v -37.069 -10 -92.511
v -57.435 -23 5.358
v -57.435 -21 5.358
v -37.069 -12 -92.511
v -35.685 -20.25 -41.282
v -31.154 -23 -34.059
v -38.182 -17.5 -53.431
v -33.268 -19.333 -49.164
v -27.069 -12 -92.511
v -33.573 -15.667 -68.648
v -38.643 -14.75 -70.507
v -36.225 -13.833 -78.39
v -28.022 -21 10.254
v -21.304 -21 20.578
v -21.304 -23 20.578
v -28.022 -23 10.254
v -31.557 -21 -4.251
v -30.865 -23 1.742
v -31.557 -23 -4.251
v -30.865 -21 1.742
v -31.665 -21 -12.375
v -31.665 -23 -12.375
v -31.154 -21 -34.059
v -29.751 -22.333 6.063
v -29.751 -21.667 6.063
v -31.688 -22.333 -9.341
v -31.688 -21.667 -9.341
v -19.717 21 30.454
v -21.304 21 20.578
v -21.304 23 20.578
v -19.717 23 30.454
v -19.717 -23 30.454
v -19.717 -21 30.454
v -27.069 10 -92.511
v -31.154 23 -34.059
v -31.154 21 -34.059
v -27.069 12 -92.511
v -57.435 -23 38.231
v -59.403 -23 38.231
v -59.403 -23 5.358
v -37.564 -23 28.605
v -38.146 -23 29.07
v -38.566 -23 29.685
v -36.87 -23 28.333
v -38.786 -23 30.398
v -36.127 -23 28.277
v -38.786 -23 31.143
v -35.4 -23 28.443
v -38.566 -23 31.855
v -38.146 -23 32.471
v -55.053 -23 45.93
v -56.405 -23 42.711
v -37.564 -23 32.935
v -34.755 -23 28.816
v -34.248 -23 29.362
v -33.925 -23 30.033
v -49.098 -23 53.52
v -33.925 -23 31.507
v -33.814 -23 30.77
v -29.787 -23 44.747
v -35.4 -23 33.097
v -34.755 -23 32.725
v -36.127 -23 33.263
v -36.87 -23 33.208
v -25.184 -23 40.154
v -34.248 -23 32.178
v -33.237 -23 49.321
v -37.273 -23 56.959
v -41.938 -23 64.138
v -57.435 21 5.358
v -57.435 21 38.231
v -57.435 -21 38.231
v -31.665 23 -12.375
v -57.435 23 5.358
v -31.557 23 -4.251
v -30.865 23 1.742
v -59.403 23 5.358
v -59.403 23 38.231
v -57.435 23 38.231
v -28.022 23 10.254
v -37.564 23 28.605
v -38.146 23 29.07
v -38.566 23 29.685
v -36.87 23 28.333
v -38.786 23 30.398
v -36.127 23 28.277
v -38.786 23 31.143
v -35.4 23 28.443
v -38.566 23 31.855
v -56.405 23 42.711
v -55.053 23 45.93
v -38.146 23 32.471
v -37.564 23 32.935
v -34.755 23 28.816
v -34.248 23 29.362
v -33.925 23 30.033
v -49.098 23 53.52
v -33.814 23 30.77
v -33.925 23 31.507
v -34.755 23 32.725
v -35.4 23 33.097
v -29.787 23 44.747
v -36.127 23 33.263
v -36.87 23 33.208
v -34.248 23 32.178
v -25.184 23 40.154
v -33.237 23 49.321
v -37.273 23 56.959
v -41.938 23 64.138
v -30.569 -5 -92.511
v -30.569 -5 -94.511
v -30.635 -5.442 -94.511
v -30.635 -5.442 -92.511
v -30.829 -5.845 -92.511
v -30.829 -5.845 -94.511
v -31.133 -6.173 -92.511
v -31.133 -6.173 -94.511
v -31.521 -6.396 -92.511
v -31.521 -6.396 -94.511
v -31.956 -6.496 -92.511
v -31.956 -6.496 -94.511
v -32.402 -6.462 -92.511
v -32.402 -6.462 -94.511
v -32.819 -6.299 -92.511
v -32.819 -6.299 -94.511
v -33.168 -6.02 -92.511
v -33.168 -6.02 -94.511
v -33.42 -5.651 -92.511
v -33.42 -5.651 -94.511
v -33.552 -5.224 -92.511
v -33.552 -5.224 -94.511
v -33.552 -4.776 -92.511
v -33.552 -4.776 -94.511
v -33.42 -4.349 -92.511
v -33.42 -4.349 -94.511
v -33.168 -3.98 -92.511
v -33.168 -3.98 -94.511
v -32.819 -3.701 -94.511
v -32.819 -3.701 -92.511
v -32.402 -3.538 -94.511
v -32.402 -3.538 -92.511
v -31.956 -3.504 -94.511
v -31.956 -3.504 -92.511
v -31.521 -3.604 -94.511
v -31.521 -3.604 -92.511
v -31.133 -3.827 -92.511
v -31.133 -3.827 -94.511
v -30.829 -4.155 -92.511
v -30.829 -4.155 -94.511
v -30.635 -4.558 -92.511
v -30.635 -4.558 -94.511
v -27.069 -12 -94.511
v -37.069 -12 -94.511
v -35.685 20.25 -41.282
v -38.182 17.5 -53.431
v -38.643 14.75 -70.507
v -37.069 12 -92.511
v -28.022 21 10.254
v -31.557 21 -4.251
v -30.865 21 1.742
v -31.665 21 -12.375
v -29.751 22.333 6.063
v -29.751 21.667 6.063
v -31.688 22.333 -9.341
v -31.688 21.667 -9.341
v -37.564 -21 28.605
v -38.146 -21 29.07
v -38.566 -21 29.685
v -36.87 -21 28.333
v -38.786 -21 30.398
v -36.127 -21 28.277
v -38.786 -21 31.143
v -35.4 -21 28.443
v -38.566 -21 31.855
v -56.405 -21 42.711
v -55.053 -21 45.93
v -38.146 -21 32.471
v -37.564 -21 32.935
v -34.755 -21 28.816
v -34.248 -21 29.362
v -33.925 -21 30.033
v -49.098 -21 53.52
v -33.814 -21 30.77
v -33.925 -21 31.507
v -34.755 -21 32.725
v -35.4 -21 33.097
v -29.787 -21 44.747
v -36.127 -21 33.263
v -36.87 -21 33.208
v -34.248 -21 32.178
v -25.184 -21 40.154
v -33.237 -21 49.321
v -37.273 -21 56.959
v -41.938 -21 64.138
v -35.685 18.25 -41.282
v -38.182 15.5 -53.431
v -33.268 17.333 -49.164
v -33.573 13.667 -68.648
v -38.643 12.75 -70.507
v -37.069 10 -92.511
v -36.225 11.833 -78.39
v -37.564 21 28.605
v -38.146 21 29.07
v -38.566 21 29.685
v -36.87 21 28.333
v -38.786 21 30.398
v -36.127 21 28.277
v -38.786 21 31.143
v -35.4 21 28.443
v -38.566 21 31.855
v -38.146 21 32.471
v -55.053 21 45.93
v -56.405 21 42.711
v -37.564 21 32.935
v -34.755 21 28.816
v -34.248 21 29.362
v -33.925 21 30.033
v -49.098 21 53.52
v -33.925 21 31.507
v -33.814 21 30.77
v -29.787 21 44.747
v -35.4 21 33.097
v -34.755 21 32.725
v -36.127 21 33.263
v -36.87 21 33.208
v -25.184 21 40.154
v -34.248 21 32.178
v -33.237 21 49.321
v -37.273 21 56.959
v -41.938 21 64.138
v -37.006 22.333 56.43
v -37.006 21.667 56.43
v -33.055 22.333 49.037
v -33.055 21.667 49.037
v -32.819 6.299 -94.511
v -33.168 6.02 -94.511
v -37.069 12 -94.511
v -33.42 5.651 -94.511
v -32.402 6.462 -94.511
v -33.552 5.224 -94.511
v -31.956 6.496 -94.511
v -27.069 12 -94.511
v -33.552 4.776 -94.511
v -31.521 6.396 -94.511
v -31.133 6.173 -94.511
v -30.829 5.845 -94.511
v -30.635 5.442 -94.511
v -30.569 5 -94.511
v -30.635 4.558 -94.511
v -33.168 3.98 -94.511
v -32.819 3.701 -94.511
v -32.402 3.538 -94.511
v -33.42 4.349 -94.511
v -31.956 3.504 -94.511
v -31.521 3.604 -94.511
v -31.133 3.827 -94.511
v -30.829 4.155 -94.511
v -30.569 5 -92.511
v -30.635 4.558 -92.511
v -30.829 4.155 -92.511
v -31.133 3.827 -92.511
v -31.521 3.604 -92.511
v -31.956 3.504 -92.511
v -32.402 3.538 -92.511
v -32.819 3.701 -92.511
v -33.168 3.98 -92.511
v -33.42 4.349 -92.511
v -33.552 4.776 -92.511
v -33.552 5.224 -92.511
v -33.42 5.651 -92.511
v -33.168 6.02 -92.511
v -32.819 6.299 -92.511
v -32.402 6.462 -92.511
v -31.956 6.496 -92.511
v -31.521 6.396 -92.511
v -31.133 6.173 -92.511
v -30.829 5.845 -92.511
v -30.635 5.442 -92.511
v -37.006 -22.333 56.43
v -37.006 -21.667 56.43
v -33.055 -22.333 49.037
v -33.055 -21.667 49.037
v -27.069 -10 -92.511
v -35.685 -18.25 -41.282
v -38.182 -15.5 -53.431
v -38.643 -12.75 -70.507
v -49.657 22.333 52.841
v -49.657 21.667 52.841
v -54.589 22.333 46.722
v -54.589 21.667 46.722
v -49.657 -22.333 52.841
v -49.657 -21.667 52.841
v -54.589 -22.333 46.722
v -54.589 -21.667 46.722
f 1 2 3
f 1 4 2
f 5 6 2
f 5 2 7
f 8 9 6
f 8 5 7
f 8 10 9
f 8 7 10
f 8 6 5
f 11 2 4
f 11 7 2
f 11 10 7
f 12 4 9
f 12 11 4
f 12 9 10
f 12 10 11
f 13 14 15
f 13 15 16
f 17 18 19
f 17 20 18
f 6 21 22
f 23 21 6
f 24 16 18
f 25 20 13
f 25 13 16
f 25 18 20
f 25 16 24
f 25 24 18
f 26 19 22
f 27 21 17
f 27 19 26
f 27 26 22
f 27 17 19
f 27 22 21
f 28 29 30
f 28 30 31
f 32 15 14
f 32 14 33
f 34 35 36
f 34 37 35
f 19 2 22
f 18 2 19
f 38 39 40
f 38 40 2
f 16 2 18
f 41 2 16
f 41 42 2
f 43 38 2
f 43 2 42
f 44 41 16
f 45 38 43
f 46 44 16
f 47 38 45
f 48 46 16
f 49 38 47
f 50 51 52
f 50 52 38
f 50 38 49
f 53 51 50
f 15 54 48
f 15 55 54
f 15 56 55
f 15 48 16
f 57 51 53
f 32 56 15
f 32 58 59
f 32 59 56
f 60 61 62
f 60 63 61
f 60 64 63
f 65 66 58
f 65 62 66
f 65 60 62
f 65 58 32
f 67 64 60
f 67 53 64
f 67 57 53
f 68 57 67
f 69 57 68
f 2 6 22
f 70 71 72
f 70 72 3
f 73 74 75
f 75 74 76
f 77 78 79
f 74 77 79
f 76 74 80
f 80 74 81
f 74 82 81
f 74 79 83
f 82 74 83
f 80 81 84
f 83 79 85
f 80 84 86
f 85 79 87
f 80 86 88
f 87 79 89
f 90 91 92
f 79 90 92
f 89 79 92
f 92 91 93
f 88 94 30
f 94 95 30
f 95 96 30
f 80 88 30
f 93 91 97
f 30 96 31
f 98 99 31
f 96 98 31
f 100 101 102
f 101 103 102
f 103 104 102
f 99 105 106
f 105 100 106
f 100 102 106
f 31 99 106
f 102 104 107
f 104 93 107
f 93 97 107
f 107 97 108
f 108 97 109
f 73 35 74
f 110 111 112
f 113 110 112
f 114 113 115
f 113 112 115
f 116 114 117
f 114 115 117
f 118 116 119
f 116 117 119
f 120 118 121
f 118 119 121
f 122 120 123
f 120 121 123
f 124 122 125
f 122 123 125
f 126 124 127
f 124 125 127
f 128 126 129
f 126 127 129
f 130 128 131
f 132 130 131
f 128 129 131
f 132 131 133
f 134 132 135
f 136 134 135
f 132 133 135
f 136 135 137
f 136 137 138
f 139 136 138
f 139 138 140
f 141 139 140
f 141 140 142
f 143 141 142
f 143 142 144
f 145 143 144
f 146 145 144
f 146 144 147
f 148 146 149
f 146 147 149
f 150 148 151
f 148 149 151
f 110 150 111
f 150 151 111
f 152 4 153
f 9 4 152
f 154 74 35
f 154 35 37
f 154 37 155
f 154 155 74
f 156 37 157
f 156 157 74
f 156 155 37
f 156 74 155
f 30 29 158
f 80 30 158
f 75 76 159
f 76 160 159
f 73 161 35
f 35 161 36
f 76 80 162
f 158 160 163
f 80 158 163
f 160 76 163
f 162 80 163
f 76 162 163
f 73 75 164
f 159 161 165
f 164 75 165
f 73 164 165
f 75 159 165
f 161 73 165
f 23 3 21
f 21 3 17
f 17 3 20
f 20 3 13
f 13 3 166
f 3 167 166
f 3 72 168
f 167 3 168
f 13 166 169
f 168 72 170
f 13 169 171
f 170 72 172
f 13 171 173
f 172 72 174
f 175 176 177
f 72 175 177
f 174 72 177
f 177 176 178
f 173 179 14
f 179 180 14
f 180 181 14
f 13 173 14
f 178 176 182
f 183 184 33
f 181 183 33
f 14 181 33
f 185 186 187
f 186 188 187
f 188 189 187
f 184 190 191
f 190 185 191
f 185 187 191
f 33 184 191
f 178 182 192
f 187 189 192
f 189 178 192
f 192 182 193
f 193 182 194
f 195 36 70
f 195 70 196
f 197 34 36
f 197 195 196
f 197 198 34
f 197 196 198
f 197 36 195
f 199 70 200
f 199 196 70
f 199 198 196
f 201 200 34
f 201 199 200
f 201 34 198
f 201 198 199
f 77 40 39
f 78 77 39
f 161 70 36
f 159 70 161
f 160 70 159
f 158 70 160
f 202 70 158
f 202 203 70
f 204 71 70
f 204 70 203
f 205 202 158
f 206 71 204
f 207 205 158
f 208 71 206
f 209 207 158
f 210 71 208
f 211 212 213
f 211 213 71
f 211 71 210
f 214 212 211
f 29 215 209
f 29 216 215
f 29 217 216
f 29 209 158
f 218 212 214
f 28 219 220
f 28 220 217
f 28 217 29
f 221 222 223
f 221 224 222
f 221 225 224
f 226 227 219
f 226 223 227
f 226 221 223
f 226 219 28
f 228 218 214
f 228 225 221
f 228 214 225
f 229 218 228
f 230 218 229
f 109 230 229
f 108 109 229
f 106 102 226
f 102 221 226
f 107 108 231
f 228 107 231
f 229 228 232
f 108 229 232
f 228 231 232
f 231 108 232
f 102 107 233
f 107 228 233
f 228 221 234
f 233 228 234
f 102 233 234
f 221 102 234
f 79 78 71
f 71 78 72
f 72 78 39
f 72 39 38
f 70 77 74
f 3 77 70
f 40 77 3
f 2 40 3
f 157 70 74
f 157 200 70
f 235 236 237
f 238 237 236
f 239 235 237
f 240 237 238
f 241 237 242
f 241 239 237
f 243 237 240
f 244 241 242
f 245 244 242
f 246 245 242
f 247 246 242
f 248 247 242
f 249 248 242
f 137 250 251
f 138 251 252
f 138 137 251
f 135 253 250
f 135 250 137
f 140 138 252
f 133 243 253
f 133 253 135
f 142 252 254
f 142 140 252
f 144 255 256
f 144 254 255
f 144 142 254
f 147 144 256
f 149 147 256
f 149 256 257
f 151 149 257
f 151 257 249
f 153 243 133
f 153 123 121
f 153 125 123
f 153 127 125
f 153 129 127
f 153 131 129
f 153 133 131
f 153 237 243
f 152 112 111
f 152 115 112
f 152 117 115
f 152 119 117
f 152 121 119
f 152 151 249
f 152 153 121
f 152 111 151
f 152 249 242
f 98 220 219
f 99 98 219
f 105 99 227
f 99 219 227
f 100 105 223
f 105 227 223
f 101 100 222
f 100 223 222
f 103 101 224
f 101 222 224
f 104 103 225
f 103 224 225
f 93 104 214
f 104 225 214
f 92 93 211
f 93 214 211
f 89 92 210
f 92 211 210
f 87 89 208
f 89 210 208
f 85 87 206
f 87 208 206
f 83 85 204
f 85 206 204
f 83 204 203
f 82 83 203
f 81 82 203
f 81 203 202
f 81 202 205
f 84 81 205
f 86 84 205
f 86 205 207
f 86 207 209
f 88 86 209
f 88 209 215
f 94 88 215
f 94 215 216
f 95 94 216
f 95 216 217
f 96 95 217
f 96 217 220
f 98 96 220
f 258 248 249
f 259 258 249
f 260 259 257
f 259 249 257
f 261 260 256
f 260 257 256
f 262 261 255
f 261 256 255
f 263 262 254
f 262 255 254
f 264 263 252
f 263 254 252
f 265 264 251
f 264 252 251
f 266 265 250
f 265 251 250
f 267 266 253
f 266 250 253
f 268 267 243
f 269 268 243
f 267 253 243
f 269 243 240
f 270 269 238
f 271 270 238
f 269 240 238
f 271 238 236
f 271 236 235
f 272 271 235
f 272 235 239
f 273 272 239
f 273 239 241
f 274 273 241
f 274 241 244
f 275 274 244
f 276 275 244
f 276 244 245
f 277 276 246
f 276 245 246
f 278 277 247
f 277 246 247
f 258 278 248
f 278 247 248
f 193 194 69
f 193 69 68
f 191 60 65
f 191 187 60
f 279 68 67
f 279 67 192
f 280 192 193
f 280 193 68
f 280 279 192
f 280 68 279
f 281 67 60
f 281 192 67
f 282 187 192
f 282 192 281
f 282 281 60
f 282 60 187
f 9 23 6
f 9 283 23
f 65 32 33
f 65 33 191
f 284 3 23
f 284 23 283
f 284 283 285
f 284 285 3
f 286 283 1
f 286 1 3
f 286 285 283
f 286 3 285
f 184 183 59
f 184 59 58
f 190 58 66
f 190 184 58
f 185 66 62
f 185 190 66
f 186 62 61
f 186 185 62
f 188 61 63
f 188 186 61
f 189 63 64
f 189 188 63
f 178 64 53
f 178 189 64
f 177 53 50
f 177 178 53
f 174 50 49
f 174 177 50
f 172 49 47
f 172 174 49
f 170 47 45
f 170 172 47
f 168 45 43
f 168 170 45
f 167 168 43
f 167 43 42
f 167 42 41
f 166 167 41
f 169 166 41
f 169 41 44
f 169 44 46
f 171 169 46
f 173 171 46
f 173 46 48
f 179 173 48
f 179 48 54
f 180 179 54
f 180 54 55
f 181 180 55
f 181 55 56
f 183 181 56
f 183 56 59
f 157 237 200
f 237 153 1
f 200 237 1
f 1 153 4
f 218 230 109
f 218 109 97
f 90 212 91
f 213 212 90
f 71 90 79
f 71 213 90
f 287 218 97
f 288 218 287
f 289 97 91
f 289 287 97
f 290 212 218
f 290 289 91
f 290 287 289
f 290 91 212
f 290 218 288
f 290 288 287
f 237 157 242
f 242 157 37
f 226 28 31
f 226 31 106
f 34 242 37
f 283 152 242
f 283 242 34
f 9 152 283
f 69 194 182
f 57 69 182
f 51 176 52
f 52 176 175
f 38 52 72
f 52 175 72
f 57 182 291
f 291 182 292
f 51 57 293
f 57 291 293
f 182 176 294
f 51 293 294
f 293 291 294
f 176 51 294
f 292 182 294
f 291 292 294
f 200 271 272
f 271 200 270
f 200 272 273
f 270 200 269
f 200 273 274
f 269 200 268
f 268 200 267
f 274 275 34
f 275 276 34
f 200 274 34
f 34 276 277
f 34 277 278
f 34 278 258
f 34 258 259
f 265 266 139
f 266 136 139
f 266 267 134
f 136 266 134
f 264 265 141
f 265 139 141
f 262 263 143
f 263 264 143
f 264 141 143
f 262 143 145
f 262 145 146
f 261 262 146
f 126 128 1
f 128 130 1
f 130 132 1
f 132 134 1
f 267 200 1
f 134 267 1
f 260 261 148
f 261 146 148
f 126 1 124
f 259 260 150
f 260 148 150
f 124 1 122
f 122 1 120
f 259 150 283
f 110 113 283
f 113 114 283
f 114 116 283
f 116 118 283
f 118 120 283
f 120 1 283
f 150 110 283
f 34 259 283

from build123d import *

# Parameters (mm, degrees)
F0_R      = 2.5
F0_W      = 1.9671103259
F0_H      = 32.8726123017
F1_DEPTH  = 23
F0_W_2    = 10
F0_H_2    = 2
F2_DEPTH  = 2
F3_DEPTH  = 21
F5_DEPTH  = 2
F3_FACE_W = 2
F3_FACE_H = 47.3760884154
F2_FACE_W = 10
F2_FACE_H = 2
F5_FACE_W = 10
F5_FACE_H = 2
F9_W      = 10
F9_H      = 22
F9_R      = 1.5
F10_DEPTH = 2


with BuildPart() as f1:
    # F0 (on Front) → F1 (new body, symmetric)
    with BuildSketch(Plane.XZ):
        with BuildLine():
            add(Edge.make_bspline(
                [(-41.9375598431, 64.1377046704), (-51.2842722237, 47.7368719876), (-55.3985677235, 50.4242394975), (-57.4354853918, 38.2308801777)],
                knots=[0, 0, 0, 0, 30.1885616022, 30.1885616022, 30.1885616022, 30.1885616022], degree=3))
            Line((-57.4354853918, 38.2308801777), (-57.4354853918, 5.358267876))
            Line((-57.4354853918, 5.358267876), (-31.1536770314, -34.0594984591))
            add(Edge.make_bspline(
                [(-21.304015945, 20.5783754124), (-34.3524827141, 3.69984575), (-31.5767975227, -1.8766191306), (-31.1536770314, -34.0594984591)],
                knots=[0, 0, 0, 0, 56.0586211891, 56.0586211891, 56.0586211891, 56.0586211891], degree=3))
            Line((-21.304015945, 20.5783754124), (-19.717078656, 30.4542761296))
            Line((-19.717078656, 30.4542761296), (-25.1840222627, 40.1536934078))
            add(Edge.make_bspline(
                [(-41.9375598431, 64.1377046704), (-34.8834395409, 55.6727573276), (-36.6469696164, 50.3821708262), (-25.1840222627, 40.1536934078)],
                knots=[0, 0, 0, 0, 29.2560048145, 29.2560048145, 29.2560048145, 29.2560048145], degree=3))
        make_face()
        with Locations((-36.313764751, 30.7701863348)):
            Circle(F0_R, mode=Mode.SUBTRACT)
        with Locations((-58.4190405548, 21.7945740269)):
            Rectangle(F0_W, F0_H)
    extrude(amount=F1_DEPTH, both=True)

    # F0 (on Front) → F3 (cut, symmetric)
    with BuildSketch(Plane.XZ):
        with BuildLine():
            add(Edge.make_bspline(
                [(-41.9375598431, 64.1377046704), (-51.2842722237, 47.7368719876), (-55.3985677235, 50.4242394975), (-57.4354853918, 38.2308801777)],
                knots=[0, 0, 0, 0, 30.1885616022, 30.1885616022, 30.1885616022, 30.1885616022], degree=3))
            Line((-57.4354853918, 38.2308801777), (-57.4354853918, 5.358267876))
            Line((-57.4354853918, 5.358267876), (-31.1536770314, -34.0594984591))
            add(Edge.make_bspline(
                [(-21.304015945, 20.5783754124), (-34.3524827141, 3.69984575), (-31.5767975227, -1.8766191306), (-31.1536770314, -34.0594984591)],
                knots=[0, 0, 0, 0, 56.0586211891, 56.0586211891, 56.0586211891, 56.0586211891], degree=3))
            Line((-21.304015945, 20.5783754124), (-19.717078656, 30.4542761296))
            Line((-19.717078656, 30.4542761296), (-25.1840222627, 40.1536934078))
            add(Edge.make_bspline(
                [(-41.9375598431, 64.1377046704), (-34.8834395409, 55.6727573276), (-36.6469696164, 50.3821708262), (-25.1840222627, 40.1536934078)],
                knots=[0, 0, 0, 0, 29.2560048145, 29.2560048145, 29.2560048145, 29.2560048145], degree=3))
        make_face()
        with Locations((-36.313764751, 30.7701863348)):
            Circle(F0_R, mode=Mode.SUBTRACT)
    extrude(amount=F3_DEPTH, both=True, mode=Mode.SUBTRACT)



with BuildPart() as f2:
    # F0 (on Front) → F2 (new body)
    with BuildSketch(Plane.XZ):
        with Locations((-32.0685834799, -93.5112637015)):
            Rectangle(F0_W_2, F0_H_2)
    extrude(amount=F2_DEPTH)


with BuildPart() as f2_1:
    # F4: moved
    add(f2.part.moved(Location((0, -10, 0))))


with BuildPart() as f5:
    # F0 (on Front) → F5 (new body)
    with BuildSketch(Plane.XZ):
        with Locations((-32.0685834799, -93.5112637015)):
            Rectangle(F0_W_2, F0_H_2)
    extrude(amount=-F5_DEPTH)


with BuildPart() as f5_1:
    # F6: moved
    add(f5.part.moved(Location((0, 10, 0))))


with BuildPart() as f1_1:
    add(f1.part)

    add(f2_1.part)  # F7 merges F2
    # F3_face (on face) → F7 section 0
    with BuildSketch(Plane(origin=(-44.2945812116, -22, -14.3506152915), x_dir=(0, -1, 0), z_dir=(-0.8320181689, 0, -0.5547483813))):
        Rectangle(F3_FACE_W, F3_FACE_H)
    # F2_face (on face) → F7 section 1
    with BuildSketch(Plane(origin=(-32.0685834799, -11, -92.5112637015), x_dir=(1, 0, 0), z_dir=(0, 0, 1))):
        Rectangle(F2_FACE_W, F2_FACE_H)
    loft()


    add(f5_1.part)  # F8 merges F5
    # F3_face (on face) → F8 section 0
    with BuildSketch(Plane(origin=(-44.2945812116, -22, -14.3506152915), x_dir=(0, -1, 0), z_dir=(-0.8320181689, 0, -0.5547483813))):
        with Locations((-44, 0)):
            Rectangle(F3_FACE_W, F3_FACE_H)
    # F5_face (on face) → F8 section 1
    with BuildSketch(Plane(origin=(-32.0685834799, 11, -92.5112637015), x_dir=(1, 0, 0), z_dir=(0, 0, 1))):
        Rectangle(F5_FACE_W, F5_FACE_H)
    loft()

    # F9 (on face) → F10 (join)
    with BuildSketch(Plane(origin=(0, 0, -94.5112637015), x_dir=(1, 0, 0), z_dir=(0, 0, -1))):
        with Locations((-32.0685834799, -1)):
            Rectangle(F9_W, F9_H)
        with Locations((-32.0685834799, -5)):
            Circle(F9_R, mode=Mode.SUBTRACT)
        with Locations((-32.0685834799, 5)):
            Circle(F9_R, mode=Mode.SUBTRACT)
    extrude(amount=-F10_DEPTH)


solid = f1_1.part
